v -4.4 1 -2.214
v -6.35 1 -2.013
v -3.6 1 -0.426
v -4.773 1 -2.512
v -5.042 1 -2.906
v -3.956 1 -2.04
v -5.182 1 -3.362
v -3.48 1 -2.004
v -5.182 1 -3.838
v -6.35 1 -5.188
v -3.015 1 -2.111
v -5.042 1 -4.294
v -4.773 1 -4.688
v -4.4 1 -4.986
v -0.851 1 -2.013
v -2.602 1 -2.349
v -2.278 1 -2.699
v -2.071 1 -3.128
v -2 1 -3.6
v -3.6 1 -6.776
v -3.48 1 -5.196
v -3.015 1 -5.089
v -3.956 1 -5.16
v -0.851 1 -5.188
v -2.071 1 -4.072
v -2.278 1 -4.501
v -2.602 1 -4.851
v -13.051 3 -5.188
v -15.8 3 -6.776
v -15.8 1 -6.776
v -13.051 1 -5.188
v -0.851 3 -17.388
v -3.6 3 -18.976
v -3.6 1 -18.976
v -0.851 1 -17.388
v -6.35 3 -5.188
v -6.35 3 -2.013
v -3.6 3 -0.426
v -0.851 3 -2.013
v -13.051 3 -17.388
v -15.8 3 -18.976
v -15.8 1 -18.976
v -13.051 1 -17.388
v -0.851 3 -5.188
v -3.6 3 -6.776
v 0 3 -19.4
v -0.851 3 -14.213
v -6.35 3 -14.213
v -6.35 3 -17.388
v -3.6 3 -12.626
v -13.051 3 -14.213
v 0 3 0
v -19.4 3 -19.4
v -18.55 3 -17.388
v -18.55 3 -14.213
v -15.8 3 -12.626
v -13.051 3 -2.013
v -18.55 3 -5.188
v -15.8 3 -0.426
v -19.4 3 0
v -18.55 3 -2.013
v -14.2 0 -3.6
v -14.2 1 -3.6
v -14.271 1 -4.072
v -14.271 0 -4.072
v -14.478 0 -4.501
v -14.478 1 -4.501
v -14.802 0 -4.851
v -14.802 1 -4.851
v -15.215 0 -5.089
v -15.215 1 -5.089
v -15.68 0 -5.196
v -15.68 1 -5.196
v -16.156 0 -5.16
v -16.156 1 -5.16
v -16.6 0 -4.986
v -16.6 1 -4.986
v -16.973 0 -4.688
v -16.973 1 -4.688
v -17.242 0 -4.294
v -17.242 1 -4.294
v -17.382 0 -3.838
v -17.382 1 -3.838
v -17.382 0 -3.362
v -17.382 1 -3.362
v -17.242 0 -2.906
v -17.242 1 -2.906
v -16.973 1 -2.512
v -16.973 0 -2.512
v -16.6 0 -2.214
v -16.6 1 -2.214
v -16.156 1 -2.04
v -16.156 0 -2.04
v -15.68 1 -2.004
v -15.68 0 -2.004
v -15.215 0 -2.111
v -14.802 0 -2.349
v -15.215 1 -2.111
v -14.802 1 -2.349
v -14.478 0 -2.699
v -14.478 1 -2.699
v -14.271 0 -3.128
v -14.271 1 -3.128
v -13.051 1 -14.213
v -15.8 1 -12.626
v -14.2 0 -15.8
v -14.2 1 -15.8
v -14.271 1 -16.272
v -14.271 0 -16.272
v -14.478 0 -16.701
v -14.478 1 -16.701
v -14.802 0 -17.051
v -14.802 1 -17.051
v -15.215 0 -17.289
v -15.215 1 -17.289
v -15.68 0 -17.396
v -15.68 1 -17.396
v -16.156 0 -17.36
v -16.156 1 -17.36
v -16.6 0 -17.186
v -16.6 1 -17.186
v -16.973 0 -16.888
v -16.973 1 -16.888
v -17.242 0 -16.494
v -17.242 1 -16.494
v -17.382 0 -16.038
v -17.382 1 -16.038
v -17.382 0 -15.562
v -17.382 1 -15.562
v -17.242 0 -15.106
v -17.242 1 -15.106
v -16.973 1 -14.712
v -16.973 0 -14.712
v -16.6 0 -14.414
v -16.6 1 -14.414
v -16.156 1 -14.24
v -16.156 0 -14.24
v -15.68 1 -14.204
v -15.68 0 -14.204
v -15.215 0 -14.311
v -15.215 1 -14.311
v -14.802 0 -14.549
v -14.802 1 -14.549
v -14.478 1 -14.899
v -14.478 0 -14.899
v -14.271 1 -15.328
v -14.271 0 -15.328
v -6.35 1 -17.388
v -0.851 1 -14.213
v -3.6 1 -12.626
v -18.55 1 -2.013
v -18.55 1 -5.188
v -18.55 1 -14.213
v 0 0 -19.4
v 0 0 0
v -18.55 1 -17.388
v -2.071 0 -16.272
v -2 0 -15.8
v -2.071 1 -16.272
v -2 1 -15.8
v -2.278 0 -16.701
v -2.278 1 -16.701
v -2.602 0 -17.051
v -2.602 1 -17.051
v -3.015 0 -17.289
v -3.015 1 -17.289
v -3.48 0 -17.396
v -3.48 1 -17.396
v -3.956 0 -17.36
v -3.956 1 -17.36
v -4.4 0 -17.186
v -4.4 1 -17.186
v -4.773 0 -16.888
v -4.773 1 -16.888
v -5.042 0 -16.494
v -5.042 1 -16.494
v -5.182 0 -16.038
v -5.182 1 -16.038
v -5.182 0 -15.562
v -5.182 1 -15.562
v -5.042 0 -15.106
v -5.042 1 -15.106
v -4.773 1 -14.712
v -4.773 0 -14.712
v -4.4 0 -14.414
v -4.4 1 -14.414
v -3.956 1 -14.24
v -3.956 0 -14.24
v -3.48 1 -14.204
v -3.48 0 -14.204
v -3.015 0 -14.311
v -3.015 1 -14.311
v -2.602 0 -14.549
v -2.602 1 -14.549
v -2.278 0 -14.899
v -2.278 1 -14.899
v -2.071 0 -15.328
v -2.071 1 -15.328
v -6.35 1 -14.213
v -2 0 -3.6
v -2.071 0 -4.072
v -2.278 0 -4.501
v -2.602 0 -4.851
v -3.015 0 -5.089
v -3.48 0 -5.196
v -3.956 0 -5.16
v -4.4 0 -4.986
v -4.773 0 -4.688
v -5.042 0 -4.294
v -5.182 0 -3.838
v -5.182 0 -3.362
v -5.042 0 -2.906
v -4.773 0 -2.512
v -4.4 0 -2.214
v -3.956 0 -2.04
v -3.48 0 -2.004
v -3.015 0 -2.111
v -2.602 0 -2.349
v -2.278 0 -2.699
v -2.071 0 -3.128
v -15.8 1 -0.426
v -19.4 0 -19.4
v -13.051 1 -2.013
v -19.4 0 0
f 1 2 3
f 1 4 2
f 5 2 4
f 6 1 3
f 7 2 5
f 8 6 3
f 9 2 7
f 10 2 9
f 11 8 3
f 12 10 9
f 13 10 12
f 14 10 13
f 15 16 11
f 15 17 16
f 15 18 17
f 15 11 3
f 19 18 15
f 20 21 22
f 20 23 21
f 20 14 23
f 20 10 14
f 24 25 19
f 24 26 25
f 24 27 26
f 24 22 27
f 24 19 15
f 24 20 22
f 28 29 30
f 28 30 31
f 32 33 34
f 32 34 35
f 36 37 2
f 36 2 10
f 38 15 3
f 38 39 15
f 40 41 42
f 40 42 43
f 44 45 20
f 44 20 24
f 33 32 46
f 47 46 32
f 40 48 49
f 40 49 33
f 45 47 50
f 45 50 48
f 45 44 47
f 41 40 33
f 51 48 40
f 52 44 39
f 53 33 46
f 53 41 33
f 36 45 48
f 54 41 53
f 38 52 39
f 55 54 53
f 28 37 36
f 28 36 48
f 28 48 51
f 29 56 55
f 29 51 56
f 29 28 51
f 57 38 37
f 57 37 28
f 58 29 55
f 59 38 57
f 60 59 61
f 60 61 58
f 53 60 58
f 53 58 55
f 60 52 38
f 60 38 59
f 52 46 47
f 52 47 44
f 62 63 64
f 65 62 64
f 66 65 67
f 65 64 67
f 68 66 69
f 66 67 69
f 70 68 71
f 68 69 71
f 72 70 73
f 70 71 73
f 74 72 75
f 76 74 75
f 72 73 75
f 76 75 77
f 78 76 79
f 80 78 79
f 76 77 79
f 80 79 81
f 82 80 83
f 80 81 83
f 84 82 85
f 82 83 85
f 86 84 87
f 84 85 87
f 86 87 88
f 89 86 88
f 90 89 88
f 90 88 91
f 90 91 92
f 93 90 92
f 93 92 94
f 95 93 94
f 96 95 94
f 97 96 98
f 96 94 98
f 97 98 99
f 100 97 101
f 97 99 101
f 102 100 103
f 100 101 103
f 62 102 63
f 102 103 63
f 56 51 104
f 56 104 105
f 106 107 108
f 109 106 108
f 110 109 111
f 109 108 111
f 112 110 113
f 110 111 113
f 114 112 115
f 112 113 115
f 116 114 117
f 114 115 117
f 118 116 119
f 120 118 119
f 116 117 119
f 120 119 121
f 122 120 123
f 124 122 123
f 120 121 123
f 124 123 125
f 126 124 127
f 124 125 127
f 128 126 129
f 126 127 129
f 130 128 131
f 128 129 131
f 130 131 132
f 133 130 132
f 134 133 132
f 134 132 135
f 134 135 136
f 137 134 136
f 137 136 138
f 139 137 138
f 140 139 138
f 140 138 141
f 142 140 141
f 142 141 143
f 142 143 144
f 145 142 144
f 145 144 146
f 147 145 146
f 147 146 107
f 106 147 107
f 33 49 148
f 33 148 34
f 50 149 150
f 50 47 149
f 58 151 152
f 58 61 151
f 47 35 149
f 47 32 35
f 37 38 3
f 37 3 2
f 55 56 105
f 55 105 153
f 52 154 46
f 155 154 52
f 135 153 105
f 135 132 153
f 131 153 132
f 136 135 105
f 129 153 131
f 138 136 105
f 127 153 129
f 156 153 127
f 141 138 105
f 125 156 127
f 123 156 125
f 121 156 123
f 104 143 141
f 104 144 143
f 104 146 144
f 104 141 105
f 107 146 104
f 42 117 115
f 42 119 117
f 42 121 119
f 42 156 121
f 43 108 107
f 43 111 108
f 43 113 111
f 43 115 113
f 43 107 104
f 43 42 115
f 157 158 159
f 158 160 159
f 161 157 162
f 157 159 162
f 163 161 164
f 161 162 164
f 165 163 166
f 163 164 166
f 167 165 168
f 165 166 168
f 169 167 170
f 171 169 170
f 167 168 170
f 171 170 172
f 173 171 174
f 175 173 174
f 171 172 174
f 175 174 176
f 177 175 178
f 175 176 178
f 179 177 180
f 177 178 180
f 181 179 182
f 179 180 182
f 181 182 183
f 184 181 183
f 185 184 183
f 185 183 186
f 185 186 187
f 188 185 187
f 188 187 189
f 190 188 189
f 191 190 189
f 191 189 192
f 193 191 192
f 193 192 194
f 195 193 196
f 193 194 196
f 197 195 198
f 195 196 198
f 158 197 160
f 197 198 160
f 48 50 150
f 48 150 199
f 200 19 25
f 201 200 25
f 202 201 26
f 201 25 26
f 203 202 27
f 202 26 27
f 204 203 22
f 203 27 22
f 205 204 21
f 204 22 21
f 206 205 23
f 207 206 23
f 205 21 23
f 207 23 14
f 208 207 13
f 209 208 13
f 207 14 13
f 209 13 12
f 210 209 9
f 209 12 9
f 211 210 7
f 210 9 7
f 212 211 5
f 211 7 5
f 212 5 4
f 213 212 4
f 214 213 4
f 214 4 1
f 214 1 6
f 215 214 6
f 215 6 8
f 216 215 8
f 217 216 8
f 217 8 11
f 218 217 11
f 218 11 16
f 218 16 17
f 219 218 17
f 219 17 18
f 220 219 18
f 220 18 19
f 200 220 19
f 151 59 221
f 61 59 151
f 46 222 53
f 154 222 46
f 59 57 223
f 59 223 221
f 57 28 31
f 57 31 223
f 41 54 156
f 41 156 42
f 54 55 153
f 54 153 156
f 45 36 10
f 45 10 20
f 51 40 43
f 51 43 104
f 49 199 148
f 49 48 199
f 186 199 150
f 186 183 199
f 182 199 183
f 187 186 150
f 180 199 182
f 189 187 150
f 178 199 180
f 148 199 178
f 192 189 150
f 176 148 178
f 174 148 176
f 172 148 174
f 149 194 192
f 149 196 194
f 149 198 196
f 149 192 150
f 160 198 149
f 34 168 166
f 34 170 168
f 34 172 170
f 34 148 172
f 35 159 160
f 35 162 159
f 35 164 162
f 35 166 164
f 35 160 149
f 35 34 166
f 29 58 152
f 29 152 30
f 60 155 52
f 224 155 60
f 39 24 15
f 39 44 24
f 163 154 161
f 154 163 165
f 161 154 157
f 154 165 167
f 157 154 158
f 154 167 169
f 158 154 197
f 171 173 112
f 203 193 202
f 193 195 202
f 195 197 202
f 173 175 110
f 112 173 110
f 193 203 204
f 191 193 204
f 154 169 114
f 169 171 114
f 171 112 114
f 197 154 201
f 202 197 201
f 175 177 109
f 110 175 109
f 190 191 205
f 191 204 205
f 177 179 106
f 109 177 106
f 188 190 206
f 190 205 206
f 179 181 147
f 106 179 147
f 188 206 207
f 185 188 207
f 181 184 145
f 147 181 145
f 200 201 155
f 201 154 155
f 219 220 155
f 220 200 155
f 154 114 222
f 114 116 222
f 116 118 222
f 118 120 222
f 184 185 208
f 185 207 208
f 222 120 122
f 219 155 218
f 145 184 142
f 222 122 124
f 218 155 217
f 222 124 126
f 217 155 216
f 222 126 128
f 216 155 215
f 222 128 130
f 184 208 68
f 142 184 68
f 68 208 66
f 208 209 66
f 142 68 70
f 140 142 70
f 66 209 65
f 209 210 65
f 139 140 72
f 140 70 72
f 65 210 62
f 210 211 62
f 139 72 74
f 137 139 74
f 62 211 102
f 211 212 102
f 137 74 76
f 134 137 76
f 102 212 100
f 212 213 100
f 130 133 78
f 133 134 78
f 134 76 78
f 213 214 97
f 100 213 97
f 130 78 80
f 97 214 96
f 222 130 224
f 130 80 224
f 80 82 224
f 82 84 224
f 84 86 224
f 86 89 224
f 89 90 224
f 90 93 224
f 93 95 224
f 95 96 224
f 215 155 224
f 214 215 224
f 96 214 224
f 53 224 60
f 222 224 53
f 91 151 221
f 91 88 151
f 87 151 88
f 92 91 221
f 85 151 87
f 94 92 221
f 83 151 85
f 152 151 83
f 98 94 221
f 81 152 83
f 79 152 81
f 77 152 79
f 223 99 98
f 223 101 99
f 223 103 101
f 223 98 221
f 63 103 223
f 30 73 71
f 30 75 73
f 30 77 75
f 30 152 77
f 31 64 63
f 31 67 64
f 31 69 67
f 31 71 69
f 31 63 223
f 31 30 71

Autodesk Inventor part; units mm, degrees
ref_plane "YZ Plane" through (0, 0, 0) normal (1, 0, 0) x (0, 1, 0)
ref_plane "XZ Plane" through (0, 0, 0) normal (0, 1, 0) x (-1, 0, 0)
ref_plane "XY Plane" through (0, 0, 0) normal (0, 0, 1) x (1, 0, 0)
sketch "Sketch1" plane through (0, 0, 0) normal (0, 1, 0) x (-1, 0, 0)
  line L0 (0, 0) -> (19.4, 0)
  line L1 (19.4, 0) -> (19.4, -19.4)
  line L2 (19.4, -19.4) -> (0, -19.4)
  line L3 (0, -19.4) -> (0, 0)
  dimension "d0" = 19.4
  dimension "d1" = 19.4
extrude "Extrusion1" add sketch "Sketch1" along normal blind 3
sketch "Sketch2" plane through (0, 3, 0) normal (0, 1, 0) x (1, 0, 0)
  line L0 (-18.55, 2.013) -> (-18.55, 5.188)
  line L1 (-18.55, 5.188) -> (-15.8004, 6.7755)
  line L2 (-15.8004, 6.7755) -> (-13.0507, 5.188)
  line L3 (-13.0507, 5.188) -> (-13.0507, 2.013)
  line L4 (-13.0507, 2.013) -> (-15.8004, 0.4255)
  line L5 (-15.8004, 0.4255) -> (-18.55, 2.013)
  line L6 (-19.4, 0) -> (0, 0) projected
  line L7 (-19.4, 19.4) -> (-19.4, 0) projected
  dimension "d4" = 3.175
  dimension "d5" = 3.175
  dimension "d7" = 3.175
  dimension "d8" = 3.175
  dimension "d9" = 3.175
  dimension "d10" = 3.175
  dimension "d11" = 120
  dimension "d12" = 120
  dimension "d13" = 2.013
  dimension "d14" = 0.85
extrude "Extrusion2" cut sketch "Sketch2" against normal blind 2
pattern_linear "Rectangular Pattern1" count 2 spacing 12.2 along (0, 0, -1) count 2 spacing 12.2 along (1, 0, 0) of "Extrusion2"
sketch "Sketch3" plane through (0, 1, 0) normal (0, 1, 0) x (1, 0, 0)
  circle A0 centre (-15.8, 3.6) radius 1.6
  line L0 (-19.4, 19.4) -> (-19.4, 0) projected
  line L1 (-19.4, 0) -> (0, 0) projected
  dimension "d23" = 3.2
  dimension "d24" = 3.6
  dimension "d25" = 3.6
extrude "Extrusion3" cut sketch "Sketch3" against normal through all
pattern_linear "Rectangular Pattern2" count 2 spacing 12.2 along (0, 0, -1) count 2 spacing 12.2 along (1, 0, 0) of "Extrusion3"
equation "\"d1\" = d0"
equation "\"d5\" = d4"
equation "\"d7\" = d5"
equation "\"d9\" = d7"
equation "\"d10\" = d4"
properties part number "BOUCHON"
